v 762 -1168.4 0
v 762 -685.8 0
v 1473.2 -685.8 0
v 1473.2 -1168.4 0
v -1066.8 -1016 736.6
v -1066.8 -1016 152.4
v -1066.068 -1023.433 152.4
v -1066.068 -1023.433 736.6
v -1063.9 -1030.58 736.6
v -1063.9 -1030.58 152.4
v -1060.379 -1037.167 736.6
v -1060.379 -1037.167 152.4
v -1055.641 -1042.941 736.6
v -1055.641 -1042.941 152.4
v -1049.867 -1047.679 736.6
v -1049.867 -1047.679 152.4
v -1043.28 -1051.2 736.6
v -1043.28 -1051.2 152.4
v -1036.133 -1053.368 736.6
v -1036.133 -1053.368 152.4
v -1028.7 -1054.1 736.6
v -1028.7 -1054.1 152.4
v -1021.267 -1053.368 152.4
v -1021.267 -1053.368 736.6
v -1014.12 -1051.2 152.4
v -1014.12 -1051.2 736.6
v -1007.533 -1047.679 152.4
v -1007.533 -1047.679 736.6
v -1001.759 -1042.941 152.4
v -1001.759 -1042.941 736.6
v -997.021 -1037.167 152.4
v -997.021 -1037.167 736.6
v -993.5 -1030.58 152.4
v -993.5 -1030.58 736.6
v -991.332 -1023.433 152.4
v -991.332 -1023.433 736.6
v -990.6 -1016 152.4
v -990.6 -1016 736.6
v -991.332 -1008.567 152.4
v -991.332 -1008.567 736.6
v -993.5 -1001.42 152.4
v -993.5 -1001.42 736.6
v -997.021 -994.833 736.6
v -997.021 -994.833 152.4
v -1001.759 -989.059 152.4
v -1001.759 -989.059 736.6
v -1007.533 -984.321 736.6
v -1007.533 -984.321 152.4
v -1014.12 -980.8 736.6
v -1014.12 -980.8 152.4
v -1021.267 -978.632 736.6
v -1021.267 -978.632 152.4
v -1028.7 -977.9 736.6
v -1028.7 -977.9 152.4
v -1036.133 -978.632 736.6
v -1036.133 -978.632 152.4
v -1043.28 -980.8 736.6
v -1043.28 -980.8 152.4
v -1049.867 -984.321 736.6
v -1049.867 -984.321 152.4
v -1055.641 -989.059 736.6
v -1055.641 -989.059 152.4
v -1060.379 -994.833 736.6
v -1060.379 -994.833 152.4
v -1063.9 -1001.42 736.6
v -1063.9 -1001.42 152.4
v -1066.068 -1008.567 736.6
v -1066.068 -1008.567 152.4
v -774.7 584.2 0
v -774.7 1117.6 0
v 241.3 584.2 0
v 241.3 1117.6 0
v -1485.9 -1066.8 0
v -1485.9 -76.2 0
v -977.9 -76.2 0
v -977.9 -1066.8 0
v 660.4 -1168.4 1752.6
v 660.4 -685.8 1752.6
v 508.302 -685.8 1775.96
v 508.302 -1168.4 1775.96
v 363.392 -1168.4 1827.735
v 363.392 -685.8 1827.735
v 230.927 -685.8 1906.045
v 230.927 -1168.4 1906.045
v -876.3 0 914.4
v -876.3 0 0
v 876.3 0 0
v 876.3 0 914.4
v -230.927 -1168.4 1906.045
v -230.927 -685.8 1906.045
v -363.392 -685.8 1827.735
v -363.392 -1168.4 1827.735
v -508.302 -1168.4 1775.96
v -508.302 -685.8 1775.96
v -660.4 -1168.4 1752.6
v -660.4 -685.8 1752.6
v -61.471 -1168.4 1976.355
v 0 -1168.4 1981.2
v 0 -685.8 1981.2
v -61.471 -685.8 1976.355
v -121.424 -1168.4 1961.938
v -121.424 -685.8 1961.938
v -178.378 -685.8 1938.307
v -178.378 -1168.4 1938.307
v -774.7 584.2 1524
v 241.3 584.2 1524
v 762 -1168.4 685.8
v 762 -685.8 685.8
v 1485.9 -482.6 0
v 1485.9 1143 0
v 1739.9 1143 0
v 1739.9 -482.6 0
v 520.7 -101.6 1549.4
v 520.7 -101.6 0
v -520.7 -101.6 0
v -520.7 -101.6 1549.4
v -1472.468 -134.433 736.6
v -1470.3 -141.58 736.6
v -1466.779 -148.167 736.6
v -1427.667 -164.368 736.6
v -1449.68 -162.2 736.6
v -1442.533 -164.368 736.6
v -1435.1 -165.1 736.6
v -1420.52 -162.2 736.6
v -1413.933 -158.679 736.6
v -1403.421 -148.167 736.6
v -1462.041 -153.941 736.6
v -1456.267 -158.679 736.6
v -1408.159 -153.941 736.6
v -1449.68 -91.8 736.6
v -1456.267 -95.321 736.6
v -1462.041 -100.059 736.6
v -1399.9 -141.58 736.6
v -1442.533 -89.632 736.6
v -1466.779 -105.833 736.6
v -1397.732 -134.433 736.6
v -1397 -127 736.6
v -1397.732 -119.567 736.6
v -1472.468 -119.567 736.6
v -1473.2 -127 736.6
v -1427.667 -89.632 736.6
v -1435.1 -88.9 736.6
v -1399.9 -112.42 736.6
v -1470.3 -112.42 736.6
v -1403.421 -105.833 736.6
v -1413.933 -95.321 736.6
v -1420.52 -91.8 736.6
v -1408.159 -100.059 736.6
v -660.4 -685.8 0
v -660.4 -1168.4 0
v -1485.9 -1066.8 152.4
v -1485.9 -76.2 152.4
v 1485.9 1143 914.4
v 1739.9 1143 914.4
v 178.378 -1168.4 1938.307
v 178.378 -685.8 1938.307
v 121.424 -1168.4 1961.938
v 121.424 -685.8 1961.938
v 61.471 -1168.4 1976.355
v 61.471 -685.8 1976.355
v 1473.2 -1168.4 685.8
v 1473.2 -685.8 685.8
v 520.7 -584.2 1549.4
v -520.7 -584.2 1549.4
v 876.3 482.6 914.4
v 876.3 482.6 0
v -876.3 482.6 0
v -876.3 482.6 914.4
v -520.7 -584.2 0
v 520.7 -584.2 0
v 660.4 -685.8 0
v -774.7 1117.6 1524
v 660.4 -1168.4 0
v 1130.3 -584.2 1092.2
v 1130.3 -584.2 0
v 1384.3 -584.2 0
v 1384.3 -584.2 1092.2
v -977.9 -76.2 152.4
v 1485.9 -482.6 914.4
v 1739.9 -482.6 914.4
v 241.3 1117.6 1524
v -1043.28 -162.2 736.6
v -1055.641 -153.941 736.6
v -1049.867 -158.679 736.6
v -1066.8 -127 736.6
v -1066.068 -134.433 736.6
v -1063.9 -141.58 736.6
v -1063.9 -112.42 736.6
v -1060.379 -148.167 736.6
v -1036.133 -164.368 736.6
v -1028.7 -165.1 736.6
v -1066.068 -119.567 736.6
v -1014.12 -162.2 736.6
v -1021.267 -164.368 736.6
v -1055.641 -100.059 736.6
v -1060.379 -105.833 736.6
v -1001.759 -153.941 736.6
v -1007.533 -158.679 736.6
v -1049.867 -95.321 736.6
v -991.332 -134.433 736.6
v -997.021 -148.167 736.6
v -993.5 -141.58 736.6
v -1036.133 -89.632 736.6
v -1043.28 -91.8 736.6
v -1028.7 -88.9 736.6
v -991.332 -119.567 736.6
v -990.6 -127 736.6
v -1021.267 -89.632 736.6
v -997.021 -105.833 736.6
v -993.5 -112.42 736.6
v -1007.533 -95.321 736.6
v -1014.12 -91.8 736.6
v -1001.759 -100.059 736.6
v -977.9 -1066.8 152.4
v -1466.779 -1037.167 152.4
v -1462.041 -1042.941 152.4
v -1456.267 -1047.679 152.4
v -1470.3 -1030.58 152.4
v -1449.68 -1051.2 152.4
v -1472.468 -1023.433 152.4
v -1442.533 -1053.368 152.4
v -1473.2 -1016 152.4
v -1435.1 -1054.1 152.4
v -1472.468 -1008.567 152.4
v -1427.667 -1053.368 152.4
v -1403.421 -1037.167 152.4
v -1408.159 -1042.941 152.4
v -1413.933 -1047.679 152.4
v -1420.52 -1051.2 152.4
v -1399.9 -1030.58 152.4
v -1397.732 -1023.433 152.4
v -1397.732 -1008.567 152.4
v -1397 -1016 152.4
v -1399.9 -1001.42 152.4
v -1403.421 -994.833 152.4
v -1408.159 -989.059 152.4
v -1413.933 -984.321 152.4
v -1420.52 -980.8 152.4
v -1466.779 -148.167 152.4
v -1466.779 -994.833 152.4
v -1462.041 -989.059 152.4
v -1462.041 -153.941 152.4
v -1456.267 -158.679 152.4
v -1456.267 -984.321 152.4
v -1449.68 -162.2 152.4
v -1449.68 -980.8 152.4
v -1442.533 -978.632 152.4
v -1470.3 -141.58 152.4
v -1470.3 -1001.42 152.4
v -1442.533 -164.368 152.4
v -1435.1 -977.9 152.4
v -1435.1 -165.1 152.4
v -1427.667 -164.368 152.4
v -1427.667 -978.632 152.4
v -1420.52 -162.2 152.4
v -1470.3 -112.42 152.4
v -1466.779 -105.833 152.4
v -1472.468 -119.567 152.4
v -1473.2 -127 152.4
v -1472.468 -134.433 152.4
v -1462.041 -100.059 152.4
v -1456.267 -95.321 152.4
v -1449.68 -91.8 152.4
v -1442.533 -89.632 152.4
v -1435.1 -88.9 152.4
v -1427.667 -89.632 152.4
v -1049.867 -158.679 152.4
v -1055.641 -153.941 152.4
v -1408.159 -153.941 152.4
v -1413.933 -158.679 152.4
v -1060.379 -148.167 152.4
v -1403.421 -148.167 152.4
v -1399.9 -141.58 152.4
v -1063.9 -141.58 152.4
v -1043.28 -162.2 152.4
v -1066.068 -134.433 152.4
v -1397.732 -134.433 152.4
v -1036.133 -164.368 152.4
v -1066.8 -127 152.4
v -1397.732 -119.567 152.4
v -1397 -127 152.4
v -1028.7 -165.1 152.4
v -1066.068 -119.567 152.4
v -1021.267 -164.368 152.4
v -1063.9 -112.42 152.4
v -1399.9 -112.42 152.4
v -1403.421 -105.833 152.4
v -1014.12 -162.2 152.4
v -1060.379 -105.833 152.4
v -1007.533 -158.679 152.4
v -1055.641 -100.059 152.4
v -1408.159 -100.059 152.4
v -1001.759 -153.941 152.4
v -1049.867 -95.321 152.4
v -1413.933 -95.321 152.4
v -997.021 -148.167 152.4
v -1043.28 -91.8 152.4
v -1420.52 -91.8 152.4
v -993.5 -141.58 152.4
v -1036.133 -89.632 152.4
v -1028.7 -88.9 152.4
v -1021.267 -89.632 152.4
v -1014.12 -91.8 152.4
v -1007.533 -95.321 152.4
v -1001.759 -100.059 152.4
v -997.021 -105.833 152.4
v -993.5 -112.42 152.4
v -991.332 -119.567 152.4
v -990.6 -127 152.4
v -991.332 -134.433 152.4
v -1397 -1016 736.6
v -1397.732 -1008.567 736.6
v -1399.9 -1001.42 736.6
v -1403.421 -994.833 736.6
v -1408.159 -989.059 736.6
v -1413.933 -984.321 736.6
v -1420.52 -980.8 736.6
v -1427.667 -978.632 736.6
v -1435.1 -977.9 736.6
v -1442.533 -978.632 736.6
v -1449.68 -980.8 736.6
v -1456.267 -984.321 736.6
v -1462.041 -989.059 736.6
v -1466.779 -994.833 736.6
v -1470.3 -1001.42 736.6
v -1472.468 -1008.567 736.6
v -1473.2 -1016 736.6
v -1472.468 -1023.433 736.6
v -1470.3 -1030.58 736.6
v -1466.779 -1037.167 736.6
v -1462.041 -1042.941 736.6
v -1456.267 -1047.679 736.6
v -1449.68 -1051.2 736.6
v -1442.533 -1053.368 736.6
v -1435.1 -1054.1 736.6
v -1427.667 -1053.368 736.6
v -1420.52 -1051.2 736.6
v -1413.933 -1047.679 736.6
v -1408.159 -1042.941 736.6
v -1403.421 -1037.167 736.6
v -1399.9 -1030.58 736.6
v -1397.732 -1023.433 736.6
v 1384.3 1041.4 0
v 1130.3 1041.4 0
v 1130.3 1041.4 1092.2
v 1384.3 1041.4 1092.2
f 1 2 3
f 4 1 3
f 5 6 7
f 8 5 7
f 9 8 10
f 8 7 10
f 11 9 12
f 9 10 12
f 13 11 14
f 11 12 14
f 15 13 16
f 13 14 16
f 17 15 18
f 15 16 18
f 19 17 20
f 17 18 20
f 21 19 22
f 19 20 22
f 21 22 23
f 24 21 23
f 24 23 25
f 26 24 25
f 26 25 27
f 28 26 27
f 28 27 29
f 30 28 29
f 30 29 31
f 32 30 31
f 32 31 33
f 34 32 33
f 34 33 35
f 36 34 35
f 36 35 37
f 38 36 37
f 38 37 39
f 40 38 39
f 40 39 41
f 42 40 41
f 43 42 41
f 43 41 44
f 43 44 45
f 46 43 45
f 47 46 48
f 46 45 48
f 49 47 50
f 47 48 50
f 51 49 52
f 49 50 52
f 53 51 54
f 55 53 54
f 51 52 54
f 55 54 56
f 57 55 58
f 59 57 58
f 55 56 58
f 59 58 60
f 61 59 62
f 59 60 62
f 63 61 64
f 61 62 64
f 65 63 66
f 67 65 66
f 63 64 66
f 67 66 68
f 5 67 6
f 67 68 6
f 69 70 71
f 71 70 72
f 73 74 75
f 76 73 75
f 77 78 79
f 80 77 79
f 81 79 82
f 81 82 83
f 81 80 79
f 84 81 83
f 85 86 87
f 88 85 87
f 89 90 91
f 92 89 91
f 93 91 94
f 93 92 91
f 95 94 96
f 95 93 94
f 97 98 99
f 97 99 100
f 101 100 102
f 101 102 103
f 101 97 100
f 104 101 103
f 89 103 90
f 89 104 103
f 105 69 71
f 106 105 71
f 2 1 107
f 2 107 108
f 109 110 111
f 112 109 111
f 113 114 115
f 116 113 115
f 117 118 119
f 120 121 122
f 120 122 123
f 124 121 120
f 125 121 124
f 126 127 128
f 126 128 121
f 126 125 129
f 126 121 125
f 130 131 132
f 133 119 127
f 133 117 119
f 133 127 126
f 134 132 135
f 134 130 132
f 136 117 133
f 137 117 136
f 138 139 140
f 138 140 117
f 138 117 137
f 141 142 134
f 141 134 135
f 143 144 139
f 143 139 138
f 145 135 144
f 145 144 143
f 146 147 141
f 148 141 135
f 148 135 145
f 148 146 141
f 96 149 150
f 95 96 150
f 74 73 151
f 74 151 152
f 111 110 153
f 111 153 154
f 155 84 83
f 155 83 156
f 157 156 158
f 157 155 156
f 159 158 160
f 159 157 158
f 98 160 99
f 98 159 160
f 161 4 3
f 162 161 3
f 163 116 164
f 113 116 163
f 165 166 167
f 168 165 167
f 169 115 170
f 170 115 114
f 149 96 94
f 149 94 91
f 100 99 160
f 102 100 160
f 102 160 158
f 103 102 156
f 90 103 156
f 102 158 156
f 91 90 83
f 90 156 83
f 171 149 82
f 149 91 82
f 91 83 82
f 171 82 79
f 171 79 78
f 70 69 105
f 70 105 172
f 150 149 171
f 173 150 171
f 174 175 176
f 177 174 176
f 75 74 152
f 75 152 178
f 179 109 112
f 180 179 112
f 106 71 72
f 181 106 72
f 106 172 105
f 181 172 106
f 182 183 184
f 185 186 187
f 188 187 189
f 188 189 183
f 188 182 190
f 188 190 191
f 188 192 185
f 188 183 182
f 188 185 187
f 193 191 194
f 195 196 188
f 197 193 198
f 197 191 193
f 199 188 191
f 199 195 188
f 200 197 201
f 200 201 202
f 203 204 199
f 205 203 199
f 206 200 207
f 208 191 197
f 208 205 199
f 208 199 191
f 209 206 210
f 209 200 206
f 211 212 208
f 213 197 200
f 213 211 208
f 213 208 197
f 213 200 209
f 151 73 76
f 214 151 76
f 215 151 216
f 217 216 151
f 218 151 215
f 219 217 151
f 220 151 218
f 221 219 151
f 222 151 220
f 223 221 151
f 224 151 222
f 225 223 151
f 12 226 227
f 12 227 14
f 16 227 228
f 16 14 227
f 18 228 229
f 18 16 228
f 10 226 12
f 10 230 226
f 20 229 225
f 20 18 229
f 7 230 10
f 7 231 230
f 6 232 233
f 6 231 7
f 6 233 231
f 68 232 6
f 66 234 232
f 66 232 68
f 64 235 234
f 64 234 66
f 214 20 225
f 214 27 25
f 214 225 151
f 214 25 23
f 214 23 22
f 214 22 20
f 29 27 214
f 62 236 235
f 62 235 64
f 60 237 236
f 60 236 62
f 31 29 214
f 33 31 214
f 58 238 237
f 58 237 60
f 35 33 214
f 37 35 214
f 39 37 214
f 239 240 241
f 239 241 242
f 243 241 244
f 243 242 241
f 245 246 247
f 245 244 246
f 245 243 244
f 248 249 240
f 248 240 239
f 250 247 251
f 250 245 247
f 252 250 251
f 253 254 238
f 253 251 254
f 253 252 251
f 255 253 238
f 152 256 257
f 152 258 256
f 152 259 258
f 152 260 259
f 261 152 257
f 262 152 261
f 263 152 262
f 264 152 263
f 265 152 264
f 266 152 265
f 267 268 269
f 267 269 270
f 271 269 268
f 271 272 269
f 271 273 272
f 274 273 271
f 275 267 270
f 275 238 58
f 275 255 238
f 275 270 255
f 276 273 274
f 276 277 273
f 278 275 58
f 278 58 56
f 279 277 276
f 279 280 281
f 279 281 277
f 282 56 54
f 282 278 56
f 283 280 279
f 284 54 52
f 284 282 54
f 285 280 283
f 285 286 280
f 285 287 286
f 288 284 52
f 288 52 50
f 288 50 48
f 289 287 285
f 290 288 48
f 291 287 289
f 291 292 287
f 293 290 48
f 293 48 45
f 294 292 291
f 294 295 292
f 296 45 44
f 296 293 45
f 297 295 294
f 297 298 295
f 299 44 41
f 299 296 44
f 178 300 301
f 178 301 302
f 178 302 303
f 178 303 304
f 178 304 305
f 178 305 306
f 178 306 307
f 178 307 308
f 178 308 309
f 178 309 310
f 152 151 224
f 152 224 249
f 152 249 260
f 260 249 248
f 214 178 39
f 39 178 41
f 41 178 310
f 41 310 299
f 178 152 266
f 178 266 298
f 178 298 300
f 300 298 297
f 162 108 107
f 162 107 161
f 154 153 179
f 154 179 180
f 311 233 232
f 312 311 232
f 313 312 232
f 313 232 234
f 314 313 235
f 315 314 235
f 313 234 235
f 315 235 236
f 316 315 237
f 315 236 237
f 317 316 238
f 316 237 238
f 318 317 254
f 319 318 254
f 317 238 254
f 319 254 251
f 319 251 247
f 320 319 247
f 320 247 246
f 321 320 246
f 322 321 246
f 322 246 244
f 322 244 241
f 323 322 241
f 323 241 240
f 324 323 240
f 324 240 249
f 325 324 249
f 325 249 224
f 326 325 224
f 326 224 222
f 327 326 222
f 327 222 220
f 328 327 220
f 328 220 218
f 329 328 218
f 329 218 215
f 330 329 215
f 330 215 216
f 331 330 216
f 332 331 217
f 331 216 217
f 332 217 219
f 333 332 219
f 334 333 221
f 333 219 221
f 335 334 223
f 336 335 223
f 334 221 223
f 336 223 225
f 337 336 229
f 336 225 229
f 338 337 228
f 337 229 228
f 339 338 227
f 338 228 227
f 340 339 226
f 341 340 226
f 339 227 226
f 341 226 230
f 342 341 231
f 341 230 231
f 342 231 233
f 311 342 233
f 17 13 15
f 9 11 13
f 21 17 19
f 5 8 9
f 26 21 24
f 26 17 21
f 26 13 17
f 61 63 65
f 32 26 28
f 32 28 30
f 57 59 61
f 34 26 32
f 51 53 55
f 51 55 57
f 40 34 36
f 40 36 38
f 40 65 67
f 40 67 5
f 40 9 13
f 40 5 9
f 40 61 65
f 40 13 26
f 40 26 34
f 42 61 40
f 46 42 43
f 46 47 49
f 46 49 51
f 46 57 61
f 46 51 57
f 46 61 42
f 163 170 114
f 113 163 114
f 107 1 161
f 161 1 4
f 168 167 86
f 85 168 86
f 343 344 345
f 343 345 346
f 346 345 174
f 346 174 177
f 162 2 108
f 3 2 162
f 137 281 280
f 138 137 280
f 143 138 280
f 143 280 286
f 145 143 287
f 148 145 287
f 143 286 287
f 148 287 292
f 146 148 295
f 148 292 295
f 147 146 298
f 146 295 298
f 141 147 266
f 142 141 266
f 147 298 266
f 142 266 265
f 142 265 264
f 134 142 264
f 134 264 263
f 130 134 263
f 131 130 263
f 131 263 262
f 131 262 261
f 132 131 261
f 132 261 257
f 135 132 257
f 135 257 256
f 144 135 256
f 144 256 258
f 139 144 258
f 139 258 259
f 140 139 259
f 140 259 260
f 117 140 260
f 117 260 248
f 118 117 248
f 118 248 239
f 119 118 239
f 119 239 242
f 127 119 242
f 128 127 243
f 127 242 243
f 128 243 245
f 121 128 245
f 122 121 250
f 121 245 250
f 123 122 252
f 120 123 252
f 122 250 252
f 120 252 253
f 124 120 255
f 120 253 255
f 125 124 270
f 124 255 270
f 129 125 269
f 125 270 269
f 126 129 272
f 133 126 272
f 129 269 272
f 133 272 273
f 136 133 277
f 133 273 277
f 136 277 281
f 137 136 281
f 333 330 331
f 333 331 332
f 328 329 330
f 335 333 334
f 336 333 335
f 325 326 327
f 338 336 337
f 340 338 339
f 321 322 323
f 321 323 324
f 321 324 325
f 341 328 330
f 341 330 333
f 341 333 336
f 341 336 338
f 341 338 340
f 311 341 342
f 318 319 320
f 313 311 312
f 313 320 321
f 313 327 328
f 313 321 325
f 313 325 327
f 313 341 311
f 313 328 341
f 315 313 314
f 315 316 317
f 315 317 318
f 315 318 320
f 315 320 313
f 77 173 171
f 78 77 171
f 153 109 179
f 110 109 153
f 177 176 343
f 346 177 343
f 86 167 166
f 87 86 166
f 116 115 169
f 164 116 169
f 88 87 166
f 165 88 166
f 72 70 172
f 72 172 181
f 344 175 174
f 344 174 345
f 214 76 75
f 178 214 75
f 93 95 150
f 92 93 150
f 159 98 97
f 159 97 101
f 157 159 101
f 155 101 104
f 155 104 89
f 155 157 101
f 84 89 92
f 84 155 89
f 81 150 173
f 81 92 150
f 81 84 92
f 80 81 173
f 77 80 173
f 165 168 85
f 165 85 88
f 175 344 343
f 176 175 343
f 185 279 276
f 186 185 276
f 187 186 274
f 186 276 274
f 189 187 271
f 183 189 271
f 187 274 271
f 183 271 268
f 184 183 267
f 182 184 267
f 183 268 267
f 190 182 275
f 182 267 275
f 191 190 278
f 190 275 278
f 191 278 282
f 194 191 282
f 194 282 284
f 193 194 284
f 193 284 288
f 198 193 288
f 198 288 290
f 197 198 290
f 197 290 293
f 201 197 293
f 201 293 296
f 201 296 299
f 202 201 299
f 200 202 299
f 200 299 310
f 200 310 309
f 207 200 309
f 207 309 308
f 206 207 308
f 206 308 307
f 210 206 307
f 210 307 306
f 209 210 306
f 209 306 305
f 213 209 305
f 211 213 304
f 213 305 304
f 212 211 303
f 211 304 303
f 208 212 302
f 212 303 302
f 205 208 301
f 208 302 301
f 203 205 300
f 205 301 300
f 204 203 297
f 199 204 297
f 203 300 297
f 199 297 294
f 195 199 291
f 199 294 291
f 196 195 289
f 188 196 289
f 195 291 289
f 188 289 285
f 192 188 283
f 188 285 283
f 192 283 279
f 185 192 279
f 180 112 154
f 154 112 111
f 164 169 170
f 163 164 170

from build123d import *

# Parameters (mm, degrees)
F1_DEPTH  = 914.4
F2_DEPTH  = 1549.4
F3_DEPTH  = 1752.6
F5_DEPTH  = 482.6
F0_W      = 1016
F0_H      = 533.4
F6_DEPTH  = 1524
F0_W_2    = 711.2
F0_H_2    = 482.6
F7_DEPTH  = 685.8
F0_W_3    = 254
F0_H_3    = 1625.6
F8_DEPTH  = 1092.2
F9_DEPTH  = 914.4
F0_W_4    = 508
F0_H_4    = 990.6
F0_R      = 38.1
F10_DEPTH = 152.4
F11_DEPTH = 736.6


with BuildPart() as f1:
    # F0 (on Top) → F1 (new body)
    with BuildSketch(Plane.XY):
        Polygon((876.3, 482.6), (-876.3, 482.6), (-876.3, 0), (0, 0), (876.3, 0), align=None)
    extrude(amount=F1_DEPTH)


with BuildPart() as f2:
    # F0 (on Top) → F2 (new body)
    with BuildSketch(Plane.XY):
        Polygon((520.7, -101.6), (0, -101.6), (-520.7, -101.6), (-520.7, -584.2), (0, -584.2), (520.7, -584.2), align=None)
    extrude(amount=F2_DEPTH)


with BuildPart() as f3:
    # F0 (on Top) → F3 (new body)
    with BuildSketch(Plane.XY):
        Polygon((660.4, -685.8), (0, -685.8), (-660.4, -685.8), (-660.4, -1168.4), (660.4, -1168.4), align=None)
    extrude(amount=F3_DEPTH)

    # F4 (on face) → F5 (join, through all)
    with BuildSketch(Plane.XZ.offset(1168.4)):
        with BuildLine():
            ThreePointArc((-230.926639, 1906.044583), (-434.611541, 1798.389661), (-660.4, 1752.6))
            Line((-660.4, 1752.6), (0, 1752.6))
            Line((0, 1752.6), (0, 1981.2))
            ThreePointArc((0, 1981.2), (-121.424307, 1961.938347), (-230.926639, 1906.044583))
        make_face()
        with BuildLine():
            Line((0, 1981.2), (0, 1752.6))
            Line((0, 1752.6), (660.4, 1752.6))
            ThreePointArc((660.4, 1752.6), (434.611541, 1798.389661), (230.926639, 1906.044583))
            ThreePointArc((230.926639, 1906.044583), (121.424307, 1961.938347), (0, 1981.2))
        make_face()
    extrude(amount=-F5_DEPTH)


with BuildPart() as f6:
    # F0 (on Top) → F6 (new body)
    with BuildSketch(Plane.XY):
        with Locations((-266.7, 850.9)):
            Rectangle(F0_W, F0_H)
    extrude(amount=F6_DEPTH)


with BuildPart() as f7:
    # F0 (on Top) → F7 (new body)
    with BuildSketch(Plane.XY):
        with Locations((1117.6, -927.1)):
            Rectangle(F0_W_2, F0_H_2)
    extrude(amount=F7_DEPTH)


with BuildPart() as f8:
    # F0 (on Top) → F8 (new body)
    with BuildSketch(Plane.XY):
        with Locations((1257.3, 228.6)):
            Rectangle(F0_W_3, F0_H_3)
    extrude(amount=F8_DEPTH)


with BuildPart() as f9:
    # F0 (on Top) → F9 (new body)
    with BuildSketch(Plane.XY):
        with Locations((1612.9, 330.2)):
            Rectangle(F0_W_3, F0_H_3)
    extrude(amount=F9_DEPTH)


with BuildPart() as f10:
    # F0 (on Top) → F10 (new body)
    with BuildSketch(Plane.XY):
        with Locations((-1231.9, -571.5)):
            Rectangle(F0_W_4, F0_H_4)
        with Locations((-1435.1, -1016)):
            Circle(F0_R, mode=Mode.SUBTRACT)
        with BuildLine():
            ThreePointArc((-990.6, -1016), (-1028.7, -1054.1), (-1066.8, -1016))
            ThreePointArc((-1066.8, -1016), (-1028.7, -977.9), (-990.6, -1016))
        make_face(mode=Mode.SUBTRACT)
        with Locations((-1435.1, -127)):
            Circle(F0_R, mode=Mode.SUBTRACT)
        with BuildLine():
            ThreePointArc((-990.6, -127), (-1028.7, -165.1), (-1066.8, -127))
            ThreePointArc((-1066.8, -127), (-1028.7, -88.9), (-990.6, -127))
        make_face(mode=Mode.SUBTRACT)
    extrude(amount=F10_DEPTH)

    # F0 (on Top) → F11 (join)
    with BuildSketch(Plane.XY):
        with Locations((-1435.1, -127)):
            Circle(F0_R)
        with BuildLine():
            ThreePointArc((-990.6, -127), (-1028.7, -88.9), (-1066.8, -127))
            ThreePointArc((-1066.8, -127), (-1028.7, -165.1), (-990.6, -127))
        make_face()
        with BuildLine():
            ThreePointArc((-990.6, -1016), (-1028.7, -977.9), (-1066.8, -1016))
            ThreePointArc((-1066.8, -1016), (-1028.7, -1054.1), (-990.6, -1016))
        make_face()
        with Locations((-1435.1, -1016)):
            Circle(F0_R)
    extrude(amount=F11_DEPTH)


solid = Compound([f1.part, f2.part, f3.part, f6.part, f7.part, f8.part, f9.part, f10.part])
